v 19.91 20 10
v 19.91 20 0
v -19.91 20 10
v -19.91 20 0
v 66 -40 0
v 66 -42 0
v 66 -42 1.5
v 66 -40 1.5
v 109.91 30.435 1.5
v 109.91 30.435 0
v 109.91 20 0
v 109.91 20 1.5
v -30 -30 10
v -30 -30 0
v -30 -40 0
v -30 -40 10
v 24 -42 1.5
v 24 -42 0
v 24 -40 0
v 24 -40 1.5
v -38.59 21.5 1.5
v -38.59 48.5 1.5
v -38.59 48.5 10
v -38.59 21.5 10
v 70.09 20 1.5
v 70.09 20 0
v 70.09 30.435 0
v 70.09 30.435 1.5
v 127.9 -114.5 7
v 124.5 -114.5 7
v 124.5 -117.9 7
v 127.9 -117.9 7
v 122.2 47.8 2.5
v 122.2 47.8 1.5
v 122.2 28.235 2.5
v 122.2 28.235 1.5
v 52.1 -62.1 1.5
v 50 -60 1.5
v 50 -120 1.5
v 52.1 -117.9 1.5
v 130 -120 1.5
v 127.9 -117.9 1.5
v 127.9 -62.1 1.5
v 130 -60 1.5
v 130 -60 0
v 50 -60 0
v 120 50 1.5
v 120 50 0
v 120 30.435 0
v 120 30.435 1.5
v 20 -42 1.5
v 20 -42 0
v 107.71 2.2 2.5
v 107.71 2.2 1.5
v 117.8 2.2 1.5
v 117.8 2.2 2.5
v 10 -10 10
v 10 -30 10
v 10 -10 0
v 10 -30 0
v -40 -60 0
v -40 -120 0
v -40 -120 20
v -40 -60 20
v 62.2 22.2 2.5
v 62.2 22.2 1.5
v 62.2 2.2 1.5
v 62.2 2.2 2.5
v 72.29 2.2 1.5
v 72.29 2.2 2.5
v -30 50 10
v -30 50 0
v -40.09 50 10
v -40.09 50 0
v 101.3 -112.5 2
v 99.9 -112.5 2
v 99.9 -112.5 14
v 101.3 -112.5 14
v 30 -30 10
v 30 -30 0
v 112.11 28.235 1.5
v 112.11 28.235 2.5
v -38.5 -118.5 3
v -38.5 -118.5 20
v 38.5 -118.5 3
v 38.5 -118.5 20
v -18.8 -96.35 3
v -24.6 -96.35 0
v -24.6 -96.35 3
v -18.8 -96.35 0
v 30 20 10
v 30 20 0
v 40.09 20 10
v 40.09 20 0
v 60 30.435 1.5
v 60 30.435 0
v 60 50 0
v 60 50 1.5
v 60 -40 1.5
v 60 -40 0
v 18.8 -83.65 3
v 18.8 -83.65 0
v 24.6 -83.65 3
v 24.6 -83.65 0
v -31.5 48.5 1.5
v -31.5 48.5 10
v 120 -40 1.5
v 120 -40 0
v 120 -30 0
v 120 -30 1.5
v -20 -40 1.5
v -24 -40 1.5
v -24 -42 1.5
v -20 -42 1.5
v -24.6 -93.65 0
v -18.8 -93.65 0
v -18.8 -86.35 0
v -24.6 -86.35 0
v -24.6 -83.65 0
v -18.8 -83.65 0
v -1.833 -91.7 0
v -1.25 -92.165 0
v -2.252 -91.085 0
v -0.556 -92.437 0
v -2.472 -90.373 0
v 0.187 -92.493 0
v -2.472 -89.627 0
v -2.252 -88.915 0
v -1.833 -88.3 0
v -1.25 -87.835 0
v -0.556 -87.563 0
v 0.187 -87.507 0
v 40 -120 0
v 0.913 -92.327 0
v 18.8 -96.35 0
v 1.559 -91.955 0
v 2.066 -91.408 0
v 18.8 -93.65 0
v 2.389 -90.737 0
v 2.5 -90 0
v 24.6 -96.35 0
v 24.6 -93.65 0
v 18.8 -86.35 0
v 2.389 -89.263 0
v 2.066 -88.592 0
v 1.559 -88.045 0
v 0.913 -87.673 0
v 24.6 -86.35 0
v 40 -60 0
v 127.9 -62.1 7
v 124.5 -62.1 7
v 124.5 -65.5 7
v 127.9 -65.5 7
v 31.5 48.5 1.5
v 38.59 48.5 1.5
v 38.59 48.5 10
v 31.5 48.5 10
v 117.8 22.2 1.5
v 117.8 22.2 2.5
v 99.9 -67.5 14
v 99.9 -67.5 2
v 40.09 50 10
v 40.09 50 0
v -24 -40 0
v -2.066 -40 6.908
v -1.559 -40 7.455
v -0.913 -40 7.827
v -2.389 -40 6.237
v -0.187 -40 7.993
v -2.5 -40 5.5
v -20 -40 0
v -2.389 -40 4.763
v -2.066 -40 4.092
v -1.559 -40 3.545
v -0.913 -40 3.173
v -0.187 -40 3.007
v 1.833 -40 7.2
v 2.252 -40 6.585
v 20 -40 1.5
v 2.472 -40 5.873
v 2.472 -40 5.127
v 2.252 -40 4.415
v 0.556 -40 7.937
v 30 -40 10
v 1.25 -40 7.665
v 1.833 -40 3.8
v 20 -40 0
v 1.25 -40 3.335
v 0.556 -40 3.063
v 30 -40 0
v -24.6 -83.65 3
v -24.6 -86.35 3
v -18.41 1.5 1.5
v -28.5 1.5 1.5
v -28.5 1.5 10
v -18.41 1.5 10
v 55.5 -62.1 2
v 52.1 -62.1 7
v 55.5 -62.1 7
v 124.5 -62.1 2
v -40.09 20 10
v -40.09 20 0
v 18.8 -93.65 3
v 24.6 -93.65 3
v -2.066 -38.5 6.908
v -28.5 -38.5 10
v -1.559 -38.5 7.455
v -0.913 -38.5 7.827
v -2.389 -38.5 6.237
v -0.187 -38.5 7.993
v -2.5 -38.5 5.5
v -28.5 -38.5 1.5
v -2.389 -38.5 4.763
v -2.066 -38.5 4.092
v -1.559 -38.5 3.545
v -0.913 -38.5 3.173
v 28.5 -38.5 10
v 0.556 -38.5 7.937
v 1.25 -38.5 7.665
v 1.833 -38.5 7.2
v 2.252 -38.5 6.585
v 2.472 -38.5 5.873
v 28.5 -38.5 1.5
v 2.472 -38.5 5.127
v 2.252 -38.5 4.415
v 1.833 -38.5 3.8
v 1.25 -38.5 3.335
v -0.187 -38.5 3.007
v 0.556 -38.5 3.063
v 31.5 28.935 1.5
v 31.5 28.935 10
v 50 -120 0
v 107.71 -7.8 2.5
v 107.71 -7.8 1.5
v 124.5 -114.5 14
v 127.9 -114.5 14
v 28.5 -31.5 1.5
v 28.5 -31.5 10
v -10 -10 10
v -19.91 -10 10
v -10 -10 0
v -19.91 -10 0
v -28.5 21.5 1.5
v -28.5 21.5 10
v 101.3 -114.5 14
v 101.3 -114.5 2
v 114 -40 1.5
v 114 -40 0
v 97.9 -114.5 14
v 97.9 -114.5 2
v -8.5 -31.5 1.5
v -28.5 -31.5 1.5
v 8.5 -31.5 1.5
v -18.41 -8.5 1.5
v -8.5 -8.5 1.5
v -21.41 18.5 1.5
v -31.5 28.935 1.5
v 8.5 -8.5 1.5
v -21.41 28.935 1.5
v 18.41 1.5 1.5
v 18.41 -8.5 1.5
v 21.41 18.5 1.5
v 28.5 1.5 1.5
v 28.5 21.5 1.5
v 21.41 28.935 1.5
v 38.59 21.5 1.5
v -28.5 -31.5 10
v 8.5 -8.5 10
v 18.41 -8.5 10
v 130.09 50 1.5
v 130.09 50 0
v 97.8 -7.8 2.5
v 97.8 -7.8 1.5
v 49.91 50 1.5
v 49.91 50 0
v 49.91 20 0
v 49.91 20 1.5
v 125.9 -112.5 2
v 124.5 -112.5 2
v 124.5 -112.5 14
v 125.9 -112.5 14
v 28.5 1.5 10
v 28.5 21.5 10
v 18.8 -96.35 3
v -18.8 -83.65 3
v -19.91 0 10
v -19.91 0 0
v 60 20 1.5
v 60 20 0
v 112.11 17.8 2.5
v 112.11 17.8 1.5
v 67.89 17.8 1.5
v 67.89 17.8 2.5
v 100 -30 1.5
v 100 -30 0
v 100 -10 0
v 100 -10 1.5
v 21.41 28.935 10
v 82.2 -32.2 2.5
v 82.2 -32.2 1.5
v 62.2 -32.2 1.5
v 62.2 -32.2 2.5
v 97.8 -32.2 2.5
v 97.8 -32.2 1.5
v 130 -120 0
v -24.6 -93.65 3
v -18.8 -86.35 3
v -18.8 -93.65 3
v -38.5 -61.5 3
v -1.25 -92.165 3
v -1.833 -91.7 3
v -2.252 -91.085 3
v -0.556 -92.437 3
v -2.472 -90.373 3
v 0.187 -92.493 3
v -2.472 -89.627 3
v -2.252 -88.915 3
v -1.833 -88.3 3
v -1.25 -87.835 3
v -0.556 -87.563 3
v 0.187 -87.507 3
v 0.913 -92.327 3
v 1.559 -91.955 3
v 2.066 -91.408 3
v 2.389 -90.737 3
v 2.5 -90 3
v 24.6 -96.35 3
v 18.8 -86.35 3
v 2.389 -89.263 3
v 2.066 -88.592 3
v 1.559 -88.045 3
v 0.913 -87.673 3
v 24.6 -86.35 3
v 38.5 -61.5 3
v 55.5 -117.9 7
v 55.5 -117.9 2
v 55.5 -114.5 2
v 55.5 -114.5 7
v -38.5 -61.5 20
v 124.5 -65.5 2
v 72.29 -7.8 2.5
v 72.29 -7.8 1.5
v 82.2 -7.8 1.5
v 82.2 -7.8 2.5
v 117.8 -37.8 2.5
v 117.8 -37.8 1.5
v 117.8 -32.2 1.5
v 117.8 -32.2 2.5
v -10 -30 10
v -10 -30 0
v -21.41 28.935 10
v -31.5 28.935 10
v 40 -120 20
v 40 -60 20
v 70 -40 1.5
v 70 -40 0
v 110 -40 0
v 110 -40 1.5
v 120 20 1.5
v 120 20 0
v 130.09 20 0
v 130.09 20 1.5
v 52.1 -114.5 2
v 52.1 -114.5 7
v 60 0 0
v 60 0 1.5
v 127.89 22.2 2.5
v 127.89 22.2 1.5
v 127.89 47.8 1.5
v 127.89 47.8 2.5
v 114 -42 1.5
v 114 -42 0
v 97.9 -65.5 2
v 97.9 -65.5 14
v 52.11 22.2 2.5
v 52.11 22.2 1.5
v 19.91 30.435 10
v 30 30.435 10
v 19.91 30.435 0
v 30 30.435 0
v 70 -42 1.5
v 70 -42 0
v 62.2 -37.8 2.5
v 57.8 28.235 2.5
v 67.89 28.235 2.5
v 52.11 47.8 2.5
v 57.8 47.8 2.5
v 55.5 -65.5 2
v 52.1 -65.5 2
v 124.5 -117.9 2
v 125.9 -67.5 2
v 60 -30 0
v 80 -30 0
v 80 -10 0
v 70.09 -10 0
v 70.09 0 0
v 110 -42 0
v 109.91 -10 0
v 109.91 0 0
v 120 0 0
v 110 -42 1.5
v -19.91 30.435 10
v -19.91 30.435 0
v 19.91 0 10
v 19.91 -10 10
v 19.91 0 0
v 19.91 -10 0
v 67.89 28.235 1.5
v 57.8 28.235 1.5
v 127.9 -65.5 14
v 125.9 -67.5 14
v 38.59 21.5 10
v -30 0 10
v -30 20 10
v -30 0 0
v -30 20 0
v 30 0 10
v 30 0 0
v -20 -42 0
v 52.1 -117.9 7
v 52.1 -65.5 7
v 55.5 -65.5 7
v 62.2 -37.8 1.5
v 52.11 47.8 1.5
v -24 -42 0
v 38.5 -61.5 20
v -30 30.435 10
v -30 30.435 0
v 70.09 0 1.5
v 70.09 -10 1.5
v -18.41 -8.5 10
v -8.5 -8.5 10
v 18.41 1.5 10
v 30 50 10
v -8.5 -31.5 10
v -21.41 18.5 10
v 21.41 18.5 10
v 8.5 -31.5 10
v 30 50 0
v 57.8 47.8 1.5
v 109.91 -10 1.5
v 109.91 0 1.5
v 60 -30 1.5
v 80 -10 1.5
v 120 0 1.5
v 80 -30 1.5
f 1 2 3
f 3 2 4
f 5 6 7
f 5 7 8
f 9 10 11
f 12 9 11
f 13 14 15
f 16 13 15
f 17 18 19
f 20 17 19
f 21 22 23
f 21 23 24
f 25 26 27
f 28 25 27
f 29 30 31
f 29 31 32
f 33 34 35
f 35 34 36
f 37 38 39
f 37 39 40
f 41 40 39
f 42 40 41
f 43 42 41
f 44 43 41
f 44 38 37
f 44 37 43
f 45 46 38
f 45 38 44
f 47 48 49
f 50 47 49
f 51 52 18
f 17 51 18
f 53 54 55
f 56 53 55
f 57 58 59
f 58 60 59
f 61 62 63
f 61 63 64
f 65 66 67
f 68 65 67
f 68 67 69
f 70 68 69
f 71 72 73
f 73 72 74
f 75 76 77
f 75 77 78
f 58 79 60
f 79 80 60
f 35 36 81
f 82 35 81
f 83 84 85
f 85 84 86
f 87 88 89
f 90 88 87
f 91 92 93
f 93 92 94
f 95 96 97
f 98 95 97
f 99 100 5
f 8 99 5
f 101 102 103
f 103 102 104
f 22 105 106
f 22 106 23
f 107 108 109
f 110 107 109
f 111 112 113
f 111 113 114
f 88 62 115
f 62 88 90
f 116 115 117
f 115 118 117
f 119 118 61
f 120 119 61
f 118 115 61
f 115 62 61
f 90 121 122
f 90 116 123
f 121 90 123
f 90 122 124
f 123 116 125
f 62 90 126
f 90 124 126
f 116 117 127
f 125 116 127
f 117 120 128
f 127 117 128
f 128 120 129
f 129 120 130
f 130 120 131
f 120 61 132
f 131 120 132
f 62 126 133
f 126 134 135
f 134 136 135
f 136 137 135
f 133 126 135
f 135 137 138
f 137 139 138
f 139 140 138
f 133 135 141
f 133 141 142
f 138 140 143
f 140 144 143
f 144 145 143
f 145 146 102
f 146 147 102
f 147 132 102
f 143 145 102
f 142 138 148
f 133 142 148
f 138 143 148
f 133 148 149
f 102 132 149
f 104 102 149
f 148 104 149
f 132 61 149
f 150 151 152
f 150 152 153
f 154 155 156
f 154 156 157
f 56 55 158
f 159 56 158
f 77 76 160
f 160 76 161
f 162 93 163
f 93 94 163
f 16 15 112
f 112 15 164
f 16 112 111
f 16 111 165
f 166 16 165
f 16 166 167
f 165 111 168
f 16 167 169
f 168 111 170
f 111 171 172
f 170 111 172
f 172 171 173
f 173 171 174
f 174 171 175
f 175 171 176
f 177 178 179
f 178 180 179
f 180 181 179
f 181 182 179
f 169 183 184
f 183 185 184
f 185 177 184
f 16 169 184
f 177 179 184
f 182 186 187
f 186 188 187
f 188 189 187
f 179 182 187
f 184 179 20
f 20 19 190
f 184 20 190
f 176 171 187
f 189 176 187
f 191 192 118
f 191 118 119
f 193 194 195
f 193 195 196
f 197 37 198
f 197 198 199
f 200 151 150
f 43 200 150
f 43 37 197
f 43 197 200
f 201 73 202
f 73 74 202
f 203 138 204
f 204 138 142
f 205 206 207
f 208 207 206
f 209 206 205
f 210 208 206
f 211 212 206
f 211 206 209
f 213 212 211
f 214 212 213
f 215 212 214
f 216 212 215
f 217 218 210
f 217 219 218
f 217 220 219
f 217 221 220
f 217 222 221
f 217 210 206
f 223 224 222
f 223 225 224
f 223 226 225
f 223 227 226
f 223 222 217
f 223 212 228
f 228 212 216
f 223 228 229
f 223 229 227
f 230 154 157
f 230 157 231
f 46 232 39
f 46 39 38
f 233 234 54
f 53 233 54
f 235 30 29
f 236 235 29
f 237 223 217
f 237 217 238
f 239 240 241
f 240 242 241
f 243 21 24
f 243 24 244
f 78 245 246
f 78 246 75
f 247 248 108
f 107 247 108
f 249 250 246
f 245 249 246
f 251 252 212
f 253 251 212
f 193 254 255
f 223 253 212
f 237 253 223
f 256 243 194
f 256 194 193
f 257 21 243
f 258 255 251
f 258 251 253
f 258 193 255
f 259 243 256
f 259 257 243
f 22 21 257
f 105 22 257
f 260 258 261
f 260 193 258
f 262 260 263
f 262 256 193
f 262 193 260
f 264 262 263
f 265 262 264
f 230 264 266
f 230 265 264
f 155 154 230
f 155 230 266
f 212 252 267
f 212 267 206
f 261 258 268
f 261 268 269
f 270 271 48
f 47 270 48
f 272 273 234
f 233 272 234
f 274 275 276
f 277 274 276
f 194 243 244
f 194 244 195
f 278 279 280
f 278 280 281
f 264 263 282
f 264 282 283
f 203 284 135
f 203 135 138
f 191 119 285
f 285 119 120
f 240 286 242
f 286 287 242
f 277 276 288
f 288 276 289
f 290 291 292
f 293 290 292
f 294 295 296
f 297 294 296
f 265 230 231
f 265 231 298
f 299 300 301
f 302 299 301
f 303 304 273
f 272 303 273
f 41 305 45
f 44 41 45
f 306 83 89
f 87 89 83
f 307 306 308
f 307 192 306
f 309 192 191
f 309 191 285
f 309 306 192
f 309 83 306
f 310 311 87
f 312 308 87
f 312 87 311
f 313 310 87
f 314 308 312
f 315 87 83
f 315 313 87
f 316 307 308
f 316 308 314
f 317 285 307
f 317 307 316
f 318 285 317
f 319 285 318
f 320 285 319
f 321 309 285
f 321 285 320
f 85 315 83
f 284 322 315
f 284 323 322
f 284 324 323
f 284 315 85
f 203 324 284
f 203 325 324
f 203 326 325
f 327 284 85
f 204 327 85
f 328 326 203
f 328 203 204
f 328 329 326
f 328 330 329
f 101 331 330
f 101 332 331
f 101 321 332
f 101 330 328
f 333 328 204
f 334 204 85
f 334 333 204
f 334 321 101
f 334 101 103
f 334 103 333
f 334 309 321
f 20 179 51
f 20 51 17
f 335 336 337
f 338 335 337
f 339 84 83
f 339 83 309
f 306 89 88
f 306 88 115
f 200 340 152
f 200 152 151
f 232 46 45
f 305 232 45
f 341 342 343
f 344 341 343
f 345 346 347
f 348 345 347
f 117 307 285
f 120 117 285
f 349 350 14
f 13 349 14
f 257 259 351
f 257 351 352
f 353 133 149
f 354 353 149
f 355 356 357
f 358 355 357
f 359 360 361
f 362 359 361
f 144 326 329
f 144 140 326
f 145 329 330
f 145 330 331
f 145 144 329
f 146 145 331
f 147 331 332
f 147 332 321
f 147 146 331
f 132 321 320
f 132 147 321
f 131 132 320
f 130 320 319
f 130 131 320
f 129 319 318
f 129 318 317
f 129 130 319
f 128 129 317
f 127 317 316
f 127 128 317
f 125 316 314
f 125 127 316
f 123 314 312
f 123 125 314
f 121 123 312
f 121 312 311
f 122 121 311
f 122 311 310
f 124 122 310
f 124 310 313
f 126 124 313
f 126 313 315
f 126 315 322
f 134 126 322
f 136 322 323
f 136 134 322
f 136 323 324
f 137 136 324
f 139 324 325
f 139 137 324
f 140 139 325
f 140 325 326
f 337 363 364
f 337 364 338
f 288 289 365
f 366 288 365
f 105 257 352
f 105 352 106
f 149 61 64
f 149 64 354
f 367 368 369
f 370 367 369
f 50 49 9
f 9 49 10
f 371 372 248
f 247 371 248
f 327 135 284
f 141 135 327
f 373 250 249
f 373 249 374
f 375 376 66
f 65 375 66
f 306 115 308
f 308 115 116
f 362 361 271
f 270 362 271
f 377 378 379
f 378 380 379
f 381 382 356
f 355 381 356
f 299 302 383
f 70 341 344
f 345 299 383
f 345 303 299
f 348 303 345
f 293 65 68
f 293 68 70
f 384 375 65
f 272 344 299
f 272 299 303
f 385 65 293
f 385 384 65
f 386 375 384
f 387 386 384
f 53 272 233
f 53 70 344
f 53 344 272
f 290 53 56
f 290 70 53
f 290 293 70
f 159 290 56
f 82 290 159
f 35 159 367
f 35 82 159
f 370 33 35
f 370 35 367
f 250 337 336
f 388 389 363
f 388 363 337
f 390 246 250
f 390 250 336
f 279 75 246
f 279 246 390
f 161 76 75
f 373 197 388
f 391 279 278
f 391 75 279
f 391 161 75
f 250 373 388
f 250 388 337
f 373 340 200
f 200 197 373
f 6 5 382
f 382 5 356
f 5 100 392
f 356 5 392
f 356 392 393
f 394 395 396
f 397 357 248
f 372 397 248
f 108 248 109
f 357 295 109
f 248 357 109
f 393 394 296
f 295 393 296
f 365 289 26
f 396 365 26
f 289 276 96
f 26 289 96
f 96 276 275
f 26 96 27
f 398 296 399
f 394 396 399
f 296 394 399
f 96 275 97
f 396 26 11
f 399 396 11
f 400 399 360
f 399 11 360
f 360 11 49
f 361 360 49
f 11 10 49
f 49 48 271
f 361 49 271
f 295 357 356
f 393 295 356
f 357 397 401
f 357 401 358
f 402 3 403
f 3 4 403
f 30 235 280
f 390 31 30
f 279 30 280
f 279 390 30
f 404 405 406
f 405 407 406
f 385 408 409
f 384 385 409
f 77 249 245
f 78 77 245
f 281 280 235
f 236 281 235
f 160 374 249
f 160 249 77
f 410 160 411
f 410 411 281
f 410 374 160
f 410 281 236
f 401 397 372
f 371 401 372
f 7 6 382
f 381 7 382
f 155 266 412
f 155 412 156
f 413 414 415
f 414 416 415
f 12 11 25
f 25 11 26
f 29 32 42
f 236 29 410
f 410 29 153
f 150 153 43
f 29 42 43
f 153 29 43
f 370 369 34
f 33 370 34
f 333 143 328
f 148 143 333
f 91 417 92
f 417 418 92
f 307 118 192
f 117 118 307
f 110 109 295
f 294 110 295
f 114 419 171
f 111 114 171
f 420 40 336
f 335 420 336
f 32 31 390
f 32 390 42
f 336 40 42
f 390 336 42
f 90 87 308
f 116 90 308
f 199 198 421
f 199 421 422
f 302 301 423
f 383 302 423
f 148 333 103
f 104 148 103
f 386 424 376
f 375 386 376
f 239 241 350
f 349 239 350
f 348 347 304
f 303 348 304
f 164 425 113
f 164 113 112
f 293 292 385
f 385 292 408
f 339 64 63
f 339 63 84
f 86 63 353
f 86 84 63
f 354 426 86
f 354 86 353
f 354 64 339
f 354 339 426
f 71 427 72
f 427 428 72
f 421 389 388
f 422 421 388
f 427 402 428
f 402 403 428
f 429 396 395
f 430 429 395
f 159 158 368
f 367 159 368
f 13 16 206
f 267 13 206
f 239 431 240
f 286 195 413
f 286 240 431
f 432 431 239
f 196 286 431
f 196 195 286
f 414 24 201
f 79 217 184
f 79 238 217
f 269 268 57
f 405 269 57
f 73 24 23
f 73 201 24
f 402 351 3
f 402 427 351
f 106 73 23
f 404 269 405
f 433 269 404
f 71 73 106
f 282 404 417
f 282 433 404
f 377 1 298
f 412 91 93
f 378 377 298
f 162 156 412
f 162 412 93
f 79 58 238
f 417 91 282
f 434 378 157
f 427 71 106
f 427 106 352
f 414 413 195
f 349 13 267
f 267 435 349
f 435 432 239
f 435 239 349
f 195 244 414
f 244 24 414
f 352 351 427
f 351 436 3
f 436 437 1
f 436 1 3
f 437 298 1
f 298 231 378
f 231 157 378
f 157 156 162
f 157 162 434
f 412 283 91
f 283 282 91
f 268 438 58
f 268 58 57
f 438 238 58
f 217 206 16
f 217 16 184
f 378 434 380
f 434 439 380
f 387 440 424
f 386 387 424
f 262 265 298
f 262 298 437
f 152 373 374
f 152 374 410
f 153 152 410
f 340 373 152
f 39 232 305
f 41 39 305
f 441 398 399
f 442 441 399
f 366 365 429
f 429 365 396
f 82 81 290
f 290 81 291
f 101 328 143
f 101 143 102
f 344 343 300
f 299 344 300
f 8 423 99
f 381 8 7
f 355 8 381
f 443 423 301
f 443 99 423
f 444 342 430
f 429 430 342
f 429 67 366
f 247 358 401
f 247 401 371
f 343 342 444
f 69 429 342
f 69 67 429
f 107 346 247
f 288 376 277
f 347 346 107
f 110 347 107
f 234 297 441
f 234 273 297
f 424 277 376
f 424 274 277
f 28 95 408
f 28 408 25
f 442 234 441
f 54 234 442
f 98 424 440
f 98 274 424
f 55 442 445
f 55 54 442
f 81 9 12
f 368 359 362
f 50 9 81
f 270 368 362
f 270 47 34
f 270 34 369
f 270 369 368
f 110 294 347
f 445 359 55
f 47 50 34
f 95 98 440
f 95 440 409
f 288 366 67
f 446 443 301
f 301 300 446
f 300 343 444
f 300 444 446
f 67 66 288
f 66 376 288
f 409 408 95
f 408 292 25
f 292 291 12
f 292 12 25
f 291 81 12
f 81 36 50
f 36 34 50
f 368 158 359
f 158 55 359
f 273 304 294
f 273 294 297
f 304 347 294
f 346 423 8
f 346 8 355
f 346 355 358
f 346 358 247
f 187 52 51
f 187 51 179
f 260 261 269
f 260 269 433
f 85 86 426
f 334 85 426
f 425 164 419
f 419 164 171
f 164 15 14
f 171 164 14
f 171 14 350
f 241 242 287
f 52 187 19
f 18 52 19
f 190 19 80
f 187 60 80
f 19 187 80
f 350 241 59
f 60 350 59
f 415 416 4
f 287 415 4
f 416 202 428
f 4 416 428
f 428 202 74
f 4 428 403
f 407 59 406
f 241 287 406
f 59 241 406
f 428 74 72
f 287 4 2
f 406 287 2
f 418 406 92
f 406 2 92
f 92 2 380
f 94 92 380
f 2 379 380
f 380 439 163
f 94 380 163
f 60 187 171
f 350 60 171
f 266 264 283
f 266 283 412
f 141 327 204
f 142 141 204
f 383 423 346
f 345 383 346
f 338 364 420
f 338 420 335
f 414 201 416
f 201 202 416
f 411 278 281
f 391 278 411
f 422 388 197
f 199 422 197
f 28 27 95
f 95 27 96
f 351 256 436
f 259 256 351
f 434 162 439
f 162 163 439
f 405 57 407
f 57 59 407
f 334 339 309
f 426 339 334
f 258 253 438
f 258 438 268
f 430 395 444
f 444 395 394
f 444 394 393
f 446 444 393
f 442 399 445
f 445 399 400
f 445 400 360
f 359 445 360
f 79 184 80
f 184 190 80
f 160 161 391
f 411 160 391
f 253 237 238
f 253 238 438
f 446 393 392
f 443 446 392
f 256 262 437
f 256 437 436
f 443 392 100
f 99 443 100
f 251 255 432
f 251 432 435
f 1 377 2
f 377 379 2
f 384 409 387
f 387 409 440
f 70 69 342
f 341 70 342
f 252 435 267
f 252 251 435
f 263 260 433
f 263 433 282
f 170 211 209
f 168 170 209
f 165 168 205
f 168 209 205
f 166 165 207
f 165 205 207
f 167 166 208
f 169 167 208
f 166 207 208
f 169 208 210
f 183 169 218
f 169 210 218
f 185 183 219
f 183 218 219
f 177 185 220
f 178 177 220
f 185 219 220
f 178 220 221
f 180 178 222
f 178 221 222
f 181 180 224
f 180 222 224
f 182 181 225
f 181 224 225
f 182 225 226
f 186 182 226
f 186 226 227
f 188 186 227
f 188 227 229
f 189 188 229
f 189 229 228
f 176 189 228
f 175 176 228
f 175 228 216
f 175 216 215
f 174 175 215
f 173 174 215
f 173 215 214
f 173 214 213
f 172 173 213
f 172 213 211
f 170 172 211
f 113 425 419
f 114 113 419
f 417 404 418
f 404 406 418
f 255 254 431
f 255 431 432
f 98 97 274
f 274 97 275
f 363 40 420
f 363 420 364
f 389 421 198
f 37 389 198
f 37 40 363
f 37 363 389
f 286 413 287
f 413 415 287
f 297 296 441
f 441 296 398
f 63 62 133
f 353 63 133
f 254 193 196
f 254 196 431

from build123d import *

# Parameters (mm, degrees)
F0_W                       = 4
F0_H                       = 2
F1_DEPTH                   = 1.5
F4_DEPTH                   = 8.5
F5_T                       = -1.5
F7_D                       = 5
F7_DEPTH                   = 20
F7_TIP                     = 1.5021515476
F9_DEPTH                   = 1
F10_W                      = 80
F10_H                      = 60
F10_W_2                    = 5.8
F10_H_2                    = 2.7
F10_R                      = 2.5
F11_DEPTH                  = 20
F12_W                      = 77
F12_H                      = 57
F13_DEPTH                  = 18.5
FPH8DFIFHSPQ4S0_2_FACE_W   = 77
FPH8DFIFHSPQ4S0_2_FACE_H   = 57
FPH8DFIFHSPQ4S0_2_FACE_W_2 = 5.8
FPH8DFIFHSPQ4S0_2_FACE_H_2 = 2.7
FPH8DFIFHSPQ4S0_2_FACE_R   = 2.5
F14_W                      = 80
F14_H                      = 60
F15_DEPTH                  = 1.5
F16_W                      = 75.8
F16_H                      = 55.8
F17_DEPTH                  = 0.5
F18_W                      = 30
F18_H                      = 49
F18_W_2                    = 26
F18_H_2                    = 45
F19_DEPTH                  = 12
F21_W                      = 23.2
F21_H                      = 2
F22_DEPTH                  = 12
F20_W                      = 3.4
F20_H                      = 3.4
F23_DEPTH                  = 5


with BuildPart() as f1:
    # F0 (on Top) → F1 (new body)
    with BuildSketch(Plane.XY):
        Polygon((-30, -30), (-30, -40), (-24, -40), (-20, -40), (20, -40), (24, -40), (30, -40), (30, -30), (10, -30), (10, -10), (19.9095545709, -10), (19.9095545709, 0), (30, 0), (30, 20), (40.0904454291, 20), (40.0904454291, 50), (30, 50), (30, 30.4353255779), (19.9095545709, 30.4353255779), (19.9095545709, 20), (-19.9095545709, 20), (-19.9095545709, 30.4353255779), (-30, 30.4353255779), (-30, 50), (-40.0904454291, 50), (-40.0904454291, 20), (-30, 20), (-30, 0), (-19.9095545709, 0), (-19.9095545709, -10), (-10, -10), (-10, -30), align=None)
        with Locations((-22, -41)):
            Rectangle(F0_W, F0_H)
        with Locations((22, -41)):
            Rectangle(F0_W, F0_H)
    extrude(amount=F1_DEPTH)


with BuildPart() as f2_1:
    # F2: copy of F1
    add(f1.part.moved(Location((90, 0, 0))))

    # F8 (on face) → F9 (join)
    with BuildSketch(Plane.XY.offset(1.5)):
        Polygon((62.2, -32.2), (62.2, -37.8), (117.8, -37.8), (117.8, -32.2), (97.8, -32.2), (97.8, -7.8), (107.7095545709, -7.8), (107.7095545709, 2.2), (117.8, 2.2), (117.8, 22.2), (127.8904454291, 22.2), (127.8904454291, 47.8), (122.2, 47.8), (122.2, 28.2353255779), (112.1095545709, 28.2353255779), (112.1095545709, 17.8), (67.8904454291, 17.8), (67.8904454291, 28.2353255779), (57.8, 28.2353255779), (57.8, 47.8), (52.1095545709, 47.8), (52.1095545709, 22.2), (62.2, 22.2), (62.2, 2.2), (72.2904454291, 2.2), (72.2904454291, -7.8), (82.2, -7.8), (82.2, -32.2), align=None)
    extrude(amount=F9_DEPTH)


with BuildPart() as f1_1:
    add(f1.part)

    # F3 (on face) → F4 (join)
    with BuildSketch(Plane.XY.offset(1.5)):
        Polygon((-30, -30), (-30, -40), (-24, -40), (-20, -40), (20, -40), (24, -40), (30, -40), (30, -30), (10, -30), (10, -10), (19.9095545709, -10), (19.9095545709, 0), (30, 0), (30, 20), (40.0904454291, 20), (40.0904454291, 50), (30, 50), (30, 30.4353255779), (19.9095545709, 30.4353255779), (19.9095545709, 20), (-19.9095545709, 20), (-19.9095545709, 30.4353255779), (-30, 30.4353255779), (-30, 50), (-40.0904454291, 50), (-40.0904454291, 20), (-30, 20), (-30, 0), (-19.9095545709, 0), (-19.9095545709, -10), (-10, -10), (-10, -30), align=None)
    extrude(amount=F4_DEPTH)

    # F5
    f5_openings = [f1_1.faces().sort_by_distance(p)[0] for p in [
        (0, 2.199533, 10),
    ]]
    offset(amount=F5_T, openings=f5_openings, kind=Kind.INTERSECTION)

    # F7
    with Locations(Plane.XZ.offset(40)):
        with Locations((0, 5.5)):
            Hole(F7_D / 2, depth=F7_DEPTH)
            with Locations((0, 0, -(F7_DEPTH + F7_TIP / 2))):  # 118° drill point
                Cone(0, F7_D / 2, F7_TIP, mode=Mode.SUBTRACT)


with BuildPart() as f11:
    # F10 (on Top) → F11 (new body)
    with BuildSketch(Plane.XY):
        with Locations((0, -90)):
            Rectangle(F10_W, F10_H)
        with Locations((-21.7, -95)):
            Rectangle(F10_W_2, F10_H_2, mode=Mode.SUBTRACT)
        with Locations((21.7, -95)):
            Rectangle(F10_W_2, F10_H_2, mode=Mode.SUBTRACT)
        with Locations((-21.7, -85)):
            Rectangle(F10_W_2, F10_H_2, mode=Mode.SUBTRACT)
        with Locations((0, -90)):
            Circle(F10_R, mode=Mode.SUBTRACT)
        with Locations((21.7, -85)):
            Rectangle(F10_W_2, F10_H_2, mode=Mode.SUBTRACT)
    extrude(amount=F11_DEPTH)

    # F12 (on face) → F13 (cut)
    with BuildSketch(Plane.XY.offset(20)):
        with Locations((0, -90)):
            Rectangle(F12_W, F12_H)
    extrude(amount=-F13_DEPTH, mode=Mode.SUBTRACT)

    # FpH8dFIfhSpq4S0_2_face (on face) + F14 (on Top) → F15 (join)
    with BuildSketch(Plane(origin=(0, -90, 1.5), x_dir=(1, 0, 0), z_dir=(0, 0, 1))):
        Rectangle(FPH8DFIFHSPQ4S0_2_FACE_W, FPH8DFIFHSPQ4S0_2_FACE_H)
        with Locations((-21.7, -5)):
            Rectangle(FPH8DFIFHSPQ4S0_2_FACE_W_2, FPH8DFIFHSPQ4S0_2_FACE_H_2, mode=Mode.SUBTRACT)
        with Locations((21.7, -5)):
            Rectangle(FPH8DFIFHSPQ4S0_2_FACE_W_2, FPH8DFIFHSPQ4S0_2_FACE_H_2, mode=Mode.SUBTRACT)
        with Locations((-21.7, 5)):
            Rectangle(FPH8DFIFHSPQ4S0_2_FACE_W_2, FPH8DFIFHSPQ4S0_2_FACE_H_2, mode=Mode.SUBTRACT)
        Circle(FPH8DFIFHSPQ4S0_2_FACE_R, mode=Mode.SUBTRACT)
        with Locations((21.7, 5)):
            Rectangle(FPH8DFIFHSPQ4S0_2_FACE_W_2, FPH8DFIFHSPQ4S0_2_FACE_H_2, mode=Mode.SUBTRACT)
    with BuildSketch(Plane.XY):
        with Locations((90, -90)):
            Rectangle(F14_W, F14_H)
    extrude(amount=F15_DEPTH)

    # F16 (on face) → F17 (join)
    with BuildSketch(Plane.XY.offset(1.5)):
        with Locations((90, -90)):
            Rectangle(F16_W, F16_H)
    extrude(amount=F17_DEPTH)

    # F18 (on face) → F19 (join)
    with BuildSketch(Plane.XY.offset(2)):
        with Locations((112.9, -90)):
            Rectangle(F18_W, F18_H)
        with Locations((112.9, -90)):
            Rectangle(F18_W_2, F18_H_2, mode=Mode.SUBTRACT)
    extrude(amount=F19_DEPTH)

    # F21 (on face) → F22 (cut)
    with BuildSketch(Plane.XY.offset(14)):
        with Locations((112.9, -113.5)):
            Rectangle(F21_W, F21_H)
    extrude(amount=-F22_DEPTH, mode=Mode.SUBTRACT)

    # F20 (on face) → F23 (join)
    with BuildSketch(Plane.XY.offset(2)):
        with Locations((126.2, -116.2)):
            Rectangle(F20_W, F20_H)
        with Locations((126.2, -63.8)):
            Rectangle(F20_W, F20_H)
        with Locations((53.8, -63.8)):
            Rectangle(F20_W, F20_H)
        with Locations((53.8, -116.2)):
            Rectangle(F20_W, F20_H)
    extrude(amount=F23_DEPTH)


solid = Compound([f2_1.part, f1_1.part, f11.part])
